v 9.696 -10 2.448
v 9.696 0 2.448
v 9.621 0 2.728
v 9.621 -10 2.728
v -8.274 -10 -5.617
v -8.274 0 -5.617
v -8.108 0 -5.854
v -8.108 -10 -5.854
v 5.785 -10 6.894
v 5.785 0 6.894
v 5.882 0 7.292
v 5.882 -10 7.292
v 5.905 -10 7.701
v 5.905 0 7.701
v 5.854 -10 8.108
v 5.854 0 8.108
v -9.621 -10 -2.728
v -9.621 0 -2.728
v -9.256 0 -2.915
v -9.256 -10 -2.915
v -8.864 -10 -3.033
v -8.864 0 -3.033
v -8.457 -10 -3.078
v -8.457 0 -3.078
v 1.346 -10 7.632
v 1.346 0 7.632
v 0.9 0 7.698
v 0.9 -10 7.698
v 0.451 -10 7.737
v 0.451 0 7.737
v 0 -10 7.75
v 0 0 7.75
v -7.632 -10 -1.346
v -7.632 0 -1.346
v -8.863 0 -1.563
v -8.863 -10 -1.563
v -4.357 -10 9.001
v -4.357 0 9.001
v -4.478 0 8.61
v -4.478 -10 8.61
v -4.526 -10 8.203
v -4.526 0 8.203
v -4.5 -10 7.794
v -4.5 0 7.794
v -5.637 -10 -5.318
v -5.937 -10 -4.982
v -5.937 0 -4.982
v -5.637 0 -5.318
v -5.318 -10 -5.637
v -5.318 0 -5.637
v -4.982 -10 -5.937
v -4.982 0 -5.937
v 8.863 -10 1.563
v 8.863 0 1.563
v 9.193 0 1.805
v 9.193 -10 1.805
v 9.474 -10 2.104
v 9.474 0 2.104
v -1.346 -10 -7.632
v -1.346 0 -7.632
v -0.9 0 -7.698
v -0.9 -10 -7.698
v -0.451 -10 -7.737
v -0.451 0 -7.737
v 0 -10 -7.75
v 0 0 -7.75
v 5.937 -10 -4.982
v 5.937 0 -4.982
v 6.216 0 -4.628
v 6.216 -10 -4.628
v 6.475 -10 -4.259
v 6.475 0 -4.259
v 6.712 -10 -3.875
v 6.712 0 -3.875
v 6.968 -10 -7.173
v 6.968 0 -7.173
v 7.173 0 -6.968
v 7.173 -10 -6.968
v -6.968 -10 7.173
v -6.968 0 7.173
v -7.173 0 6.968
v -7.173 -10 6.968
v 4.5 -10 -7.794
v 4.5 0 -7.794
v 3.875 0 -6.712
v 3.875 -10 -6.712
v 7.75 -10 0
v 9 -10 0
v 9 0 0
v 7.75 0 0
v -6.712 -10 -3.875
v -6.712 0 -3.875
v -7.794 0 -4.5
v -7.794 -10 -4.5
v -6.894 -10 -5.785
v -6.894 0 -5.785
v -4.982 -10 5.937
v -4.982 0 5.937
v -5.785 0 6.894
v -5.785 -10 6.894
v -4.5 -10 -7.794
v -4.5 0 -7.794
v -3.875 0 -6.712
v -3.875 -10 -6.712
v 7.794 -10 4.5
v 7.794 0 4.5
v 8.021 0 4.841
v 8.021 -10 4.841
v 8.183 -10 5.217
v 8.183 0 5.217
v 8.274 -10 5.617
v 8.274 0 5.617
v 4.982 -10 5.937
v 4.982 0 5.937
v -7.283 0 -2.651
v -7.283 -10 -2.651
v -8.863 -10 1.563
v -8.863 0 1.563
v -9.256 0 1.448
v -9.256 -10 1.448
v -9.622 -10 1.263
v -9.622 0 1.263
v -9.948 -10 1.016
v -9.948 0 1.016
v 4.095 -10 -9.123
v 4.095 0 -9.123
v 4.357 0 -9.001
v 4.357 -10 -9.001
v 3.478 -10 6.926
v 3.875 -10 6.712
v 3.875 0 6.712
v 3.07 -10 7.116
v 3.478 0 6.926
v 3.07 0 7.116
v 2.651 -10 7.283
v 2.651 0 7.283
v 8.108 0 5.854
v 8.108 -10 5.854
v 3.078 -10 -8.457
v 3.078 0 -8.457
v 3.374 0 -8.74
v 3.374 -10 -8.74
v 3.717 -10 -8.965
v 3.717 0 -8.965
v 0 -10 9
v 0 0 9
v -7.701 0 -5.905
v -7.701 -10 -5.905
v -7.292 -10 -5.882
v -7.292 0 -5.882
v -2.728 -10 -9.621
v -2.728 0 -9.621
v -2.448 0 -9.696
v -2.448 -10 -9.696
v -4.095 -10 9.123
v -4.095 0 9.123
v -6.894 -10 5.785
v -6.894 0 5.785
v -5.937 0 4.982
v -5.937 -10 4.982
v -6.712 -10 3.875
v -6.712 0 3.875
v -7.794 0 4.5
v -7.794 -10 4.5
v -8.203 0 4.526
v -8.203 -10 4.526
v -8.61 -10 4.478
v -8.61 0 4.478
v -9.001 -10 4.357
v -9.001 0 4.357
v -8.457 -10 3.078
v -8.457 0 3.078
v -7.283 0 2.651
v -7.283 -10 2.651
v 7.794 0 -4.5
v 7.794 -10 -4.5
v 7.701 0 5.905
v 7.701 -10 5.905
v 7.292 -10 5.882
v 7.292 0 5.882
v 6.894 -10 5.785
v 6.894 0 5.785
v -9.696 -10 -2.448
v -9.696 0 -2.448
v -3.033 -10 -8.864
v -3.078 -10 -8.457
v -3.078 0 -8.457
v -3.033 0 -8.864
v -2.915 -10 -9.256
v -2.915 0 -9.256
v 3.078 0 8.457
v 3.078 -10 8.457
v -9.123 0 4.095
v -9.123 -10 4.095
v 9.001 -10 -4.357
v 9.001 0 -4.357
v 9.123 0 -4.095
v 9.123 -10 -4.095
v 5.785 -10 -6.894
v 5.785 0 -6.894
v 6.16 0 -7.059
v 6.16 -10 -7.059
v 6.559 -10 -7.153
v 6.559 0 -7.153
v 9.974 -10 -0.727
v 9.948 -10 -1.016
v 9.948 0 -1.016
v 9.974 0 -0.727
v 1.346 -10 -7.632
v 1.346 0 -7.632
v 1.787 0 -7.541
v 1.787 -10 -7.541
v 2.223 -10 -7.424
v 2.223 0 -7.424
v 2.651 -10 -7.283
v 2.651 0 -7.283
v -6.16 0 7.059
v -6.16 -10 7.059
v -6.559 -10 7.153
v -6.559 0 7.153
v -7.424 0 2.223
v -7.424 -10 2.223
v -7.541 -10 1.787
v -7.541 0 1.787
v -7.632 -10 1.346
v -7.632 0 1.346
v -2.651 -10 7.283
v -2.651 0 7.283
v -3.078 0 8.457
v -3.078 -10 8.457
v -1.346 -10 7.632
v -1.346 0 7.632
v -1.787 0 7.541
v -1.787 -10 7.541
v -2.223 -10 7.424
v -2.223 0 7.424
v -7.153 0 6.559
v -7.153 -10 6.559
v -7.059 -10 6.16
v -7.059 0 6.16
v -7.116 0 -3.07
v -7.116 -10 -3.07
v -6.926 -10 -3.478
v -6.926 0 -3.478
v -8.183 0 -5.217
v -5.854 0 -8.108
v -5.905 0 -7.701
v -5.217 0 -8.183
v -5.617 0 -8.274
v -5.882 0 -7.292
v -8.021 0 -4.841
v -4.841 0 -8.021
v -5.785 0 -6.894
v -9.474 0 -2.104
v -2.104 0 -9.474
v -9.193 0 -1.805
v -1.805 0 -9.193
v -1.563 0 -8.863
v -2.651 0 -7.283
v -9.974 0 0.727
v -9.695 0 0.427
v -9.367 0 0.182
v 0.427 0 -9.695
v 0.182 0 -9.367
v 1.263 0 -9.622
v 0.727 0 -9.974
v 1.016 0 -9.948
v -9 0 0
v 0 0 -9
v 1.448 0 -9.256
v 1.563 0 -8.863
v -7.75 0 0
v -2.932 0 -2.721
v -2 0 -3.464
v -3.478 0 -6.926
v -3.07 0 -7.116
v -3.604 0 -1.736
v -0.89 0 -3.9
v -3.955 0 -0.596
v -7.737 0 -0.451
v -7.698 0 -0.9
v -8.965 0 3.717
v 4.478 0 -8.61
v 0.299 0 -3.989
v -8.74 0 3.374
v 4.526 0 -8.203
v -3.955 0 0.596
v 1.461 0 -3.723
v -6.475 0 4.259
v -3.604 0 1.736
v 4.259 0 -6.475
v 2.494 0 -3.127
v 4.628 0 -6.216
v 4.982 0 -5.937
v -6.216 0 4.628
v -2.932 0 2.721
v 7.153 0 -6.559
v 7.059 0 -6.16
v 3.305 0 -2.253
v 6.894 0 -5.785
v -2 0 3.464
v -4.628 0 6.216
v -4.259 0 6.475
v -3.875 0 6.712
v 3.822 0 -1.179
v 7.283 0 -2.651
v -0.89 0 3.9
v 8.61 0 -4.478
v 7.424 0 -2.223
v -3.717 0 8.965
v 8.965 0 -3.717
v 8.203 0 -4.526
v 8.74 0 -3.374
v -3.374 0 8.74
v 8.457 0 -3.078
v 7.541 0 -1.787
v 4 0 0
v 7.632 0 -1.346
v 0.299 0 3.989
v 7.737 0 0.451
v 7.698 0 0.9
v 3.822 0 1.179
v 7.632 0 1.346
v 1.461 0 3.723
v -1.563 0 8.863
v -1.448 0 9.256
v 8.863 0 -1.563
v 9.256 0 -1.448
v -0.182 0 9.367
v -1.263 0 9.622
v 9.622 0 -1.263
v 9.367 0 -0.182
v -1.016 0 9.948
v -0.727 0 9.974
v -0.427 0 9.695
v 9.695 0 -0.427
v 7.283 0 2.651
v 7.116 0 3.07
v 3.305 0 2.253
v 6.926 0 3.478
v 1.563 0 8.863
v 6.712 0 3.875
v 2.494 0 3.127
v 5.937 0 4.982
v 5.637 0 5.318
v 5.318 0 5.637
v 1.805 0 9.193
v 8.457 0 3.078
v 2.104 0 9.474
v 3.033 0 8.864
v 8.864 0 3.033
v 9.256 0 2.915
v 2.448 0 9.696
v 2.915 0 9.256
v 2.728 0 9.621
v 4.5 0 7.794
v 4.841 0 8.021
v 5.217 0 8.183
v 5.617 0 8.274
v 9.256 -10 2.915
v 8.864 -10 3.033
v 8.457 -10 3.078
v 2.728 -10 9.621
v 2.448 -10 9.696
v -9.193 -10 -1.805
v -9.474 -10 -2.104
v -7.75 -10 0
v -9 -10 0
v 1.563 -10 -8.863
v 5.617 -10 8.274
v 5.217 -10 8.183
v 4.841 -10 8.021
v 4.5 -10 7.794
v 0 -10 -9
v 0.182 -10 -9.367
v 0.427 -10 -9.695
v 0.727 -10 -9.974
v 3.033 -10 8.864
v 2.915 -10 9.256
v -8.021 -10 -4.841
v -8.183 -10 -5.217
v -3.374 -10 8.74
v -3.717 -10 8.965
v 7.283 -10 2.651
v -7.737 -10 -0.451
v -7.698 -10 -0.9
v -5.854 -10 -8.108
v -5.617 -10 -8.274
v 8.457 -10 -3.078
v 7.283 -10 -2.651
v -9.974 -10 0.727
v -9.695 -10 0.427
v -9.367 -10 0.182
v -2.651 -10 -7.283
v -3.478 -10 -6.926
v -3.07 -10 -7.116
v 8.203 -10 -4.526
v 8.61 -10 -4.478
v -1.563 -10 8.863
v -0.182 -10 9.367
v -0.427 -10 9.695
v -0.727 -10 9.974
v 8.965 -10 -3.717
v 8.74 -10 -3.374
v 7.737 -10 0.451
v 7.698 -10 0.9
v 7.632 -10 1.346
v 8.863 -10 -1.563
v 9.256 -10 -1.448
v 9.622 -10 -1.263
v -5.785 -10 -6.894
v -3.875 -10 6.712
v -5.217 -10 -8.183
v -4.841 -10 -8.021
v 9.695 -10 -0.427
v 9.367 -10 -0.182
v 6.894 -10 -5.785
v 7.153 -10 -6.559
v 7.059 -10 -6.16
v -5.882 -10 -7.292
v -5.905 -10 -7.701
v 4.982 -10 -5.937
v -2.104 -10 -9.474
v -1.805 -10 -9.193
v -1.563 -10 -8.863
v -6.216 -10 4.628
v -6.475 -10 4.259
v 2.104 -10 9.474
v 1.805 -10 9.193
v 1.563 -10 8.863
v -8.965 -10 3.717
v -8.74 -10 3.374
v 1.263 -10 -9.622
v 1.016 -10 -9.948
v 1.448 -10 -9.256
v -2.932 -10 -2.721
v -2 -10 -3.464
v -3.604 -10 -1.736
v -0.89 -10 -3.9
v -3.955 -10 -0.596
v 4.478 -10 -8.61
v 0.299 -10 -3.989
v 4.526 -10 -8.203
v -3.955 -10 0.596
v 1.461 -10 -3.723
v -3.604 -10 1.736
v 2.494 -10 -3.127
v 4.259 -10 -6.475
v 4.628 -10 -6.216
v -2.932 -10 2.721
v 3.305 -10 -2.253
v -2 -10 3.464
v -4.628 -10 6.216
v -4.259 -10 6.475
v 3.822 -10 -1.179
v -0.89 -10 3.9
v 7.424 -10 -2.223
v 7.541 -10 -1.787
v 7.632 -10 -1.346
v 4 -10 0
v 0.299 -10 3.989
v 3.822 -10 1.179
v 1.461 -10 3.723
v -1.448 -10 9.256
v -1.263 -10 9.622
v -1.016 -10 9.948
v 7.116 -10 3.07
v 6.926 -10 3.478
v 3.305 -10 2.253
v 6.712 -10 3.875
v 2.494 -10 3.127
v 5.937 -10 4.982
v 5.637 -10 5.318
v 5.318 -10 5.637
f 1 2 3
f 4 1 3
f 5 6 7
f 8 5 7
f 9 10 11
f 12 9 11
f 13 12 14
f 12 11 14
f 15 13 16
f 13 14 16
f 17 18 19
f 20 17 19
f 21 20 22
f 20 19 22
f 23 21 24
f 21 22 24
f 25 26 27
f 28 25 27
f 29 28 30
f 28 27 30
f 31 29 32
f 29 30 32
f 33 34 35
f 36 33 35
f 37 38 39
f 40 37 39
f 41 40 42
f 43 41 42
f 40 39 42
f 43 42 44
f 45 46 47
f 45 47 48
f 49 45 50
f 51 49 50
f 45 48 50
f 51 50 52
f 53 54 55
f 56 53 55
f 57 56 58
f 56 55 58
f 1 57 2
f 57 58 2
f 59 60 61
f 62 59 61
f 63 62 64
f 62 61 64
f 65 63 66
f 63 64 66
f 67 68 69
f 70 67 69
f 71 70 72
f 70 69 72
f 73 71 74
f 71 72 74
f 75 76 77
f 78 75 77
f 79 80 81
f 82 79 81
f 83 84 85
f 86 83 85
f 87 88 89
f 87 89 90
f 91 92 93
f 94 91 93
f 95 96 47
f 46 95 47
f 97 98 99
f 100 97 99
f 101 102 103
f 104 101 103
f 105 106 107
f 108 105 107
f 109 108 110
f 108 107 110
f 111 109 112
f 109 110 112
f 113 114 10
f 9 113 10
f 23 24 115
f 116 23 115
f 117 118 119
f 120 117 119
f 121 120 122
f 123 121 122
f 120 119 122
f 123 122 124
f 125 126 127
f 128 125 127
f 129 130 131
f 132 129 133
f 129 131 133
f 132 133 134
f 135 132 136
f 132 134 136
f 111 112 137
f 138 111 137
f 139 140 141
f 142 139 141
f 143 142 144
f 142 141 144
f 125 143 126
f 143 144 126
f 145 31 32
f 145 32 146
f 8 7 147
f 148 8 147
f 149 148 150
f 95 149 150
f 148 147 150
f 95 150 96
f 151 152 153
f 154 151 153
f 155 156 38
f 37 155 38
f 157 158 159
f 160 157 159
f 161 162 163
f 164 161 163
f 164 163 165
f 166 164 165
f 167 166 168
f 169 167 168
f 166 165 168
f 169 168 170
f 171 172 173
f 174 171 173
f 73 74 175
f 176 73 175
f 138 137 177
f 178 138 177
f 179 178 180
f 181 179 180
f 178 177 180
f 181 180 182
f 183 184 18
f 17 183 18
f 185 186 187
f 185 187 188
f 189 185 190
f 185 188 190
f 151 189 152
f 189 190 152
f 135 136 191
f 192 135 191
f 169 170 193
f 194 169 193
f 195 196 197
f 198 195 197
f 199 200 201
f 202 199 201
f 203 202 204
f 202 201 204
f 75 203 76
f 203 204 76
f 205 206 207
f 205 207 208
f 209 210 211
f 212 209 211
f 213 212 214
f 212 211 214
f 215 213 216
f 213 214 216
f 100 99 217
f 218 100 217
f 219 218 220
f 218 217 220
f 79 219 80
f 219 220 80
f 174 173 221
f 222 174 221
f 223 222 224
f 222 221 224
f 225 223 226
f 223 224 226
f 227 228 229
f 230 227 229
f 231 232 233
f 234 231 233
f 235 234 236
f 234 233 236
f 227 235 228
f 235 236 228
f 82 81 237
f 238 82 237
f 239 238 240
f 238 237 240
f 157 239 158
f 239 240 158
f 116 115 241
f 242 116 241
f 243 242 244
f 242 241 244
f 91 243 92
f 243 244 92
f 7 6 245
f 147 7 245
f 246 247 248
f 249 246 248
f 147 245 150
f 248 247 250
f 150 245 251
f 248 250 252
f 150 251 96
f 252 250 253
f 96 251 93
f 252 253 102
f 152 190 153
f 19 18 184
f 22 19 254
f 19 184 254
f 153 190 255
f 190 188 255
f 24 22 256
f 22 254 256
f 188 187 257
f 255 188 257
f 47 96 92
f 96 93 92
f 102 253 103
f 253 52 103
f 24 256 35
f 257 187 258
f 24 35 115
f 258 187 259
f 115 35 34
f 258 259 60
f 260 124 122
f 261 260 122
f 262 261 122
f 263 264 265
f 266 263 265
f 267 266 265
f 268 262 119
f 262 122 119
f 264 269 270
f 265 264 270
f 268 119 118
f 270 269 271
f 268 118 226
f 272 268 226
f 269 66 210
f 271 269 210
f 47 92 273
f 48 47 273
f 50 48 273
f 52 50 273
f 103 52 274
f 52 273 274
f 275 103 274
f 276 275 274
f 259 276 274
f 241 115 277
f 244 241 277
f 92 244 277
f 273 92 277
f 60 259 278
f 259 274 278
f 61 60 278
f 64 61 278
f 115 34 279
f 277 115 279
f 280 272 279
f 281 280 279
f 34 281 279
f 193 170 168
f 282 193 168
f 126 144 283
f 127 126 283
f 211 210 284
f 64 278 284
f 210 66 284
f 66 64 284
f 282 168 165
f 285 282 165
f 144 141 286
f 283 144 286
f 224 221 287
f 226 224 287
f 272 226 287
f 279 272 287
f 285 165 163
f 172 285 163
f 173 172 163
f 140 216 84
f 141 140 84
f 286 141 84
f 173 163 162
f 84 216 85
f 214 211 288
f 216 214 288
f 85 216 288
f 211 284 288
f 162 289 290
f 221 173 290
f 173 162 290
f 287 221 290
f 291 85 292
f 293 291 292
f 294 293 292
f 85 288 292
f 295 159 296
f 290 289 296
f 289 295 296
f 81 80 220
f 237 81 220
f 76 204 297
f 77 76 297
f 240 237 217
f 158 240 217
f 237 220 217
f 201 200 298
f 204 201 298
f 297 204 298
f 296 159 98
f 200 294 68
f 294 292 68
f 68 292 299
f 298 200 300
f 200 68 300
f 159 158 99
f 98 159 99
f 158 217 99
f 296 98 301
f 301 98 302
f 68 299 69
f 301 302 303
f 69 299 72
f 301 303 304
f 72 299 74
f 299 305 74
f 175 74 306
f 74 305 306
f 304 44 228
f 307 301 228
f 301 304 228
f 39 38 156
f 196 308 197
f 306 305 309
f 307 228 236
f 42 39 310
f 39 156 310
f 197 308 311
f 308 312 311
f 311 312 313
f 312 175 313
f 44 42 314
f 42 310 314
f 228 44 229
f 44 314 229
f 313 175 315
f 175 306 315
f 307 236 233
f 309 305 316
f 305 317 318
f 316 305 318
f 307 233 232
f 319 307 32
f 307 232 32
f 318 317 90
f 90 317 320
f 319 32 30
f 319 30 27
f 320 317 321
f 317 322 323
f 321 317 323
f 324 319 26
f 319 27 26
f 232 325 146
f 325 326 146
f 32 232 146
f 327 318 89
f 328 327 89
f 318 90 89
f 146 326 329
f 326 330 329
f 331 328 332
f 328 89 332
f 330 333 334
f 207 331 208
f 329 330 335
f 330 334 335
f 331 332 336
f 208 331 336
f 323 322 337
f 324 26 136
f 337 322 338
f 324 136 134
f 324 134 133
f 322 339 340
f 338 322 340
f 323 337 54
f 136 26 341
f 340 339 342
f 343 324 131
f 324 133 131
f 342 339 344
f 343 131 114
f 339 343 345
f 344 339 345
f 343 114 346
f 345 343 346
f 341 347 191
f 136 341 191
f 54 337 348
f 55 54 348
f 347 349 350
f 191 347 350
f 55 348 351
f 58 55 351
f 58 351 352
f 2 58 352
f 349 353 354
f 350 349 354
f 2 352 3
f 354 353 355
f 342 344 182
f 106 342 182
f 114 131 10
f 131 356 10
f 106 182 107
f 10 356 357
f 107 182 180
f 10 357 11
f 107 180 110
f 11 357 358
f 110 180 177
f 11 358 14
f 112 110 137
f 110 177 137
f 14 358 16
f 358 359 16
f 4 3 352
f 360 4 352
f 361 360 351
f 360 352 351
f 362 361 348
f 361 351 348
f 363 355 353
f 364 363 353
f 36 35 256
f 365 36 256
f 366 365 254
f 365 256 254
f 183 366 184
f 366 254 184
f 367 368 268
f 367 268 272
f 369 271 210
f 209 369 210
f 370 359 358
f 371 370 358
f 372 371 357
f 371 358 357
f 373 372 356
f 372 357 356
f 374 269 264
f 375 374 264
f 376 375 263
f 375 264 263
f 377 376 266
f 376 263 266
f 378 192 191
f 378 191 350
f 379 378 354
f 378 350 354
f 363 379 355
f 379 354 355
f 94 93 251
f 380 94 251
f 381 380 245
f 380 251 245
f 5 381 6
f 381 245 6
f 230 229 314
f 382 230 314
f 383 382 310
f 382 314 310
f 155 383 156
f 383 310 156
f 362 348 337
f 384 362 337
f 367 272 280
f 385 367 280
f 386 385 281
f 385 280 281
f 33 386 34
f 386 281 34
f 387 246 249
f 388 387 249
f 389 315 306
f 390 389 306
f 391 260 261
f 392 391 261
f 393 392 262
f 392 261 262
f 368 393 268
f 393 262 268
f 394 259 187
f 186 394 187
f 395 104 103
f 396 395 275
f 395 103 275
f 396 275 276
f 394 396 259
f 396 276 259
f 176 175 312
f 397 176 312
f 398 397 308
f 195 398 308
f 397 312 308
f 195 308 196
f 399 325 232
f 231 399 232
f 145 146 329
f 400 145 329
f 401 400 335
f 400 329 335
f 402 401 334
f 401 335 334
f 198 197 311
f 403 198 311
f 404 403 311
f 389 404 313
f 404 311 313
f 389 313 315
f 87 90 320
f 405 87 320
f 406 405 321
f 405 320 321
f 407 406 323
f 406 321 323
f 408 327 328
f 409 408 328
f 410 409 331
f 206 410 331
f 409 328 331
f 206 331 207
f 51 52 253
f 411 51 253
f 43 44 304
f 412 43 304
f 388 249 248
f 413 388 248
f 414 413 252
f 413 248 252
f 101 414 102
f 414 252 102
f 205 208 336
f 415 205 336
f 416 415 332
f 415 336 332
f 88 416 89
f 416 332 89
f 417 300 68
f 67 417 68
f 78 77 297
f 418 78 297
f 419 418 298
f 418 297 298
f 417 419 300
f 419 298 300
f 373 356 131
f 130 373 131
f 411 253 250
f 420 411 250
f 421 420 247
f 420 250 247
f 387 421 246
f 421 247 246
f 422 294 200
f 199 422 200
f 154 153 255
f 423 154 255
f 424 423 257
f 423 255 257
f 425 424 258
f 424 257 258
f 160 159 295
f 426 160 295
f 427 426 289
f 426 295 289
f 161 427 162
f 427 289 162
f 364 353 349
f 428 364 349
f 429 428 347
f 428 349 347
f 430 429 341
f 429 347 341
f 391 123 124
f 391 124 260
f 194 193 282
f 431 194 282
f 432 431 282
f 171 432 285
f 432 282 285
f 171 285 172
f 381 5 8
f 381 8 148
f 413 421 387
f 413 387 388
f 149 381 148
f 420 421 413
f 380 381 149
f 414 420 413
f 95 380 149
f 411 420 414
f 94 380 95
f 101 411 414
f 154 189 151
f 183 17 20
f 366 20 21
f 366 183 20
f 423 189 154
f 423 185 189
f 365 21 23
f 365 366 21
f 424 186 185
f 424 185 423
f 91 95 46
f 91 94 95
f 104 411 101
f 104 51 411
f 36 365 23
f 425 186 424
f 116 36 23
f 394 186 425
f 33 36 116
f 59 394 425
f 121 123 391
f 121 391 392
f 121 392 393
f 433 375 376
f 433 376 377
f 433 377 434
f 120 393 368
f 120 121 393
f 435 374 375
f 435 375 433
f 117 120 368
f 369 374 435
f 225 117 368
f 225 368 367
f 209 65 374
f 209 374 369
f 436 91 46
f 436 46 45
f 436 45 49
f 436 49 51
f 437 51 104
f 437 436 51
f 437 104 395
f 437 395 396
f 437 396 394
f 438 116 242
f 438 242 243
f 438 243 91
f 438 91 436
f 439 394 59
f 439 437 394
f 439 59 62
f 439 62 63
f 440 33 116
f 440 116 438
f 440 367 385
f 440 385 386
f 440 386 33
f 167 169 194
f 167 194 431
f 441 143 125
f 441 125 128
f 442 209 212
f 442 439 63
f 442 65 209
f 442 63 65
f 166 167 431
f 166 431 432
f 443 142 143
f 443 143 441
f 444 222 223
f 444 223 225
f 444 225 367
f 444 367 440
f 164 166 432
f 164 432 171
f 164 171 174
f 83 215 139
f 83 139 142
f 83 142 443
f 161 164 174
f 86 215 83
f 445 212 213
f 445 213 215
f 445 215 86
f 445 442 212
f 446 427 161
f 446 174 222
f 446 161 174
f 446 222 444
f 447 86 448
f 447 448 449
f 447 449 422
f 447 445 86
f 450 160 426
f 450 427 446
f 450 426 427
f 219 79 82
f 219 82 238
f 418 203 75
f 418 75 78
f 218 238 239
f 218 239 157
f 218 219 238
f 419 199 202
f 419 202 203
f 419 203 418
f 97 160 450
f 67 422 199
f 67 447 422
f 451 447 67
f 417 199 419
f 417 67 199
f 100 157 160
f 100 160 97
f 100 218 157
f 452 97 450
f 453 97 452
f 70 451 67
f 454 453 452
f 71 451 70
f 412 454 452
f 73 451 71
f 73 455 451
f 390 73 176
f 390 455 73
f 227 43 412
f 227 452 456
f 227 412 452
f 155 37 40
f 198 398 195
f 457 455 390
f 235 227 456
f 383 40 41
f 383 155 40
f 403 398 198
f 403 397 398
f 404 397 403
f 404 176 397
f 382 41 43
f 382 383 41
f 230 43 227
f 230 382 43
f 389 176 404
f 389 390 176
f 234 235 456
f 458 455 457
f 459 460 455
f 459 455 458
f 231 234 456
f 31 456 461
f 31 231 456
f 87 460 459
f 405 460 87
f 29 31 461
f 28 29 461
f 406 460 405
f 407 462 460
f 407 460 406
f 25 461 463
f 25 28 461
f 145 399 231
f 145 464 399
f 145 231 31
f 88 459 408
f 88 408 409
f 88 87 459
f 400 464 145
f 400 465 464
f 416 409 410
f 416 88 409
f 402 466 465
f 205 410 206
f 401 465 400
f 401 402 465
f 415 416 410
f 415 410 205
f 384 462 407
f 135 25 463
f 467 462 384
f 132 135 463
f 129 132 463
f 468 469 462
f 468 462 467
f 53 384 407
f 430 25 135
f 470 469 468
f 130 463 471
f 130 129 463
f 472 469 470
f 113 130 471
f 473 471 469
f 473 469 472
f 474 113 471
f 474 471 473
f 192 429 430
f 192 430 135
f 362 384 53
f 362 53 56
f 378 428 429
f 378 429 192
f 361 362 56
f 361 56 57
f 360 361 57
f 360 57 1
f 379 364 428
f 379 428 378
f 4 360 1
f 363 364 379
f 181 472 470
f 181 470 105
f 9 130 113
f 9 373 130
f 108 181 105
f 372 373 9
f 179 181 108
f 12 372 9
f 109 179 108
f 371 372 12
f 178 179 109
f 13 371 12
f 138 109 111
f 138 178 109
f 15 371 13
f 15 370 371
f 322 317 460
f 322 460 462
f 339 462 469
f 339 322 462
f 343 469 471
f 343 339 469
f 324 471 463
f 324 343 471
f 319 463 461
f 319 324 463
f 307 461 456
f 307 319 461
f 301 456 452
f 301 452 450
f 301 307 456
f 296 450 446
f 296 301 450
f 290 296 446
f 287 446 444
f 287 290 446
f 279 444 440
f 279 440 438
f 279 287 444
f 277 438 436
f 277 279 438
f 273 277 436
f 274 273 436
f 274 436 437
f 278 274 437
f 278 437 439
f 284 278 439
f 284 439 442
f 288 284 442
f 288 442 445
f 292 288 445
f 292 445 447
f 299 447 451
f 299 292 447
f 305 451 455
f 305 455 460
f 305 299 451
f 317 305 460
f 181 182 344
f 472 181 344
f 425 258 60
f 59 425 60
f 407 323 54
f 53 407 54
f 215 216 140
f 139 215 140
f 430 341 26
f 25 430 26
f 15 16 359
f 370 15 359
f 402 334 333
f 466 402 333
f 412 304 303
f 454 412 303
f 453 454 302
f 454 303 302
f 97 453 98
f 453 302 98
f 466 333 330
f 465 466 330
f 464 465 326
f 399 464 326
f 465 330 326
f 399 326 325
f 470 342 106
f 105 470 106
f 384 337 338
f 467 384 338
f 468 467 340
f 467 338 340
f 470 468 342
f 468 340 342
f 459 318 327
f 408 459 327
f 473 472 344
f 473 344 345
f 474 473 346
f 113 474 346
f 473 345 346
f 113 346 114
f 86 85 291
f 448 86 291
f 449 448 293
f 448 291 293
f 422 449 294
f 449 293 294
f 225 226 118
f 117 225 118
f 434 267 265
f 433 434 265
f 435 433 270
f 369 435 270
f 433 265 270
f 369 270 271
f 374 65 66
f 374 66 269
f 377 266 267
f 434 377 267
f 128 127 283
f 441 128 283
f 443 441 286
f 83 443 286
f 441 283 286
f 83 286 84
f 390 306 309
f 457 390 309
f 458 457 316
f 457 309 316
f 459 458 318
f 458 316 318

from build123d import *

# Parameters (mm, degrees)
F0_R     = 4
F1_DEPTH = 10


with BuildPart() as f1:
    # F0 (on Front) → F1 (new body)
    with BuildSketch(Plane.XZ):
        with BuildLine():
            Line((-1.562834, 8.86327), (-1.345773, 7.63226))
            ThreePointArc((-1.345773, 7.63226), (-2.005848, 7.485925), (-2.650656, 7.282618))
            Line((-2.650656, 7.282618), (-3.078181, 8.457234))
            ThreePointArc((-3.078181, 8.457234), (-3.540527, 8.860187), (-4.094507, 9.123322))
            Line((-4.094507, 9.123322), (-4.356972, 9.000933))
            ThreePointArc((-4.356972, 9.000933), (-4.51149, 8.407419), (-4.5, 7.794229))
            Line((-4.5, 7.794229), (-3.875, 6.711697))
            ThreePointArc((-3.875, 6.711697), (-4.445217, 6.348428), (-4.981604, 5.936844))
            Line((-4.981604, 5.936844), (-5.785088, 6.8944))
            ThreePointArc((-5.785088, 6.8944), (-6.357369, 7.114921), (-6.967938, 7.172715))
            Line((-6.967938, 7.172715), (-7.172715, 6.967938))
            ThreePointArc((-7.172715, 6.967938), (-7.114921, 6.357369), (-6.8944, 5.785088))
            Line((-6.8944, 5.785088), (-5.936844, 4.981604))
            ThreePointArc((-5.936844, 4.981604), (-6.348428, 4.445217), (-6.711697, 3.875))
            Line((-6.711697, 3.875), (-7.794229, 4.5))
            ThreePointArc((-7.794229, 4.5), (-8.407419, 4.51149), (-9.000933, 4.356972))
            Line((-9.000933, 4.356972), (-9.123322, 4.094507))
            ThreePointArc((-9.123322, 4.094507), (-8.860187, 3.540527), (-8.457234, 3.078181))
            Line((-8.457234, 3.078181), (-7.282618, 2.650656))
            ThreePointArc((-7.282618, 2.650656), (-7.485925, 2.005848), (-7.63226, 1.345773))
            Line((-7.63226, 1.345773), (-8.86327, 1.562834))
            ThreePointArc((-8.86327, 1.562834), (-9.44341, 1.363908), (-9.948283, 1.015714))
            Line((-9.948283, 1.015714), (-9.973523, 0.727218))
            ThreePointArc((-9.973523, 0.727218), (-9.536784, 0.296644), (-9, 0))
            Line((-9, 0), (-7.75, 0))
            ThreePointArc((-7.75, 0), (-7.720509, -0.675457), (-7.63226, -1.345773))
            Line((-7.63226, -1.345773), (-8.86327, -1.562834))
            ThreePointArc((-8.86327, -1.562834), (-9.340387, -1.948183), (-9.695722, -2.448054))
            Line((-9.695722, -2.448054), (-9.620769, -2.727784))
            ThreePointArc((-9.620769, -2.727784), (-9.063104, -2.983018), (-8.457234, -3.078181))
            Line((-8.457234, -3.078181), (-7.282618, -2.650656))
            ThreePointArc((-7.282618, -2.650656), (-7.023885, -3.275292), (-6.711697, -3.875))
            Line((-6.711697, -3.875), (-7.794229, -4.5))
            ThreePointArc((-7.794229, -4.5), (-8.110775, -5.025293), (-8.273715, -5.616551))
            Line((-8.273715, -5.616551), (-8.107608, -5.853776))
            ThreePointArc((-8.107608, -5.853776), (-7.496279, -5.902884), (-6.8944, -5.785088))
            Line((-6.8944, -5.785088), (-5.936844, -4.981604))
            ThreePointArc((-5.936844, -4.981604), (-5.480078, -5.480078), (-4.981604, -5.936844))
            Line((-4.981604, -5.936844), (-5.785088, -6.8944))
            ThreePointArc((-5.785088, -6.8944), (-5.902884, -7.496279), (-5.853776, -8.107608))
            Line((-5.853776, -8.107608), (-5.616551, -8.273715))
            ThreePointArc((-5.616551, -8.273715), (-5.025293, -8.110775), (-4.5, -7.794229))
            Line((-4.5, -7.794229), (-3.875, -6.711697))
            ThreePointArc((-3.875, -6.711697), (-3.275292, -7.023885), (-2.650656, -7.282618))
            Line((-2.650656, -7.282618), (-3.078181, -8.457234))
            ThreePointArc((-3.078181, -8.457234), (-2.983018, -9.063104), (-2.727784, -9.620769))
            Line((-2.727784, -9.620769), (-2.448054, -9.695722))
            ThreePointArc((-2.448054, -9.695722), (-1.948183, -9.340387), (-1.562834, -8.86327))
            Line((-1.562834, -8.86327), (-1.345773, -7.63226))
            ThreePointArc((-1.345773, -7.63226), (-0.675457, -7.720509), (0, -7.75))
            Line((0, -7.75), (0, -9))
            ThreePointArc((0, -9), (0.296644, -9.536784), (0.727218, -9.973523))
            Line((0.727218, -9.973523), (1.015714, -9.948283))
            ThreePointArc((1.015714, -9.948283), (1.363908, -9.44341), (1.562834, -8.86327))
            Line((1.562834, -8.86327), (1.345773, -7.63226))
            ThreePointArc((1.345773, -7.63226), (2.005848, -7.485925), (2.650656, -7.282618))
            Line((2.650656, -7.282618), (3.078181, -8.457234))
            ThreePointArc((3.078181, -8.457234), (3.540527, -8.860187), (4.094507, -9.123322))
            Line((4.094507, -9.123322), (4.356972, -9.000933))
            ThreePointArc((4.356972, -9.000933), (4.51149, -8.407419), (4.5, -7.794229))
            Line((4.5, -7.794229), (3.875, -6.711697))
            ThreePointArc((3.875, -6.711697), (4.445217, -6.348428), (4.981604, -5.936844))
            Line((4.981604, -5.936844), (5.785088, -6.8944))
            ThreePointArc((5.785088, -6.8944), (6.357369, -7.114921), (6.967938, -7.172715))
            Line((6.967938, -7.172715), (7.172715, -6.967938))
            ThreePointArc((7.172715, -6.967938), (7.114921, -6.357369), (6.8944, -5.785088))
            Line((6.8944, -5.785088), (5.936844, -4.981604))
            ThreePointArc((5.936844, -4.981604), (6.348428, -4.445217), (6.711697, -3.875))
            Line((6.711697, -3.875), (7.794229, -4.5))
            ThreePointArc((7.794229, -4.5), (8.407419, -4.51149), (9.000933, -4.356972))
            Line((9.000933, -4.356972), (9.123322, -4.094507))
            ThreePointArc((9.123322, -4.094507), (8.860187, -3.540527), (8.457234, -3.078181))
            Line((8.457234, -3.078181), (7.282618, -2.650656))
            ThreePointArc((7.282618, -2.650656), (7.485925, -2.005848), (7.63226, -1.345773))
            Line((7.63226, -1.345773), (8.86327, -1.562834))
            ThreePointArc((8.86327, -1.562834), (9.44341, -1.363908), (9.948283, -1.015714))
            Line((9.948283, -1.015714), (9.973523, -0.727218))
            ThreePointArc((9.973523, -0.727218), (9.536784, -0.296644), (9, 0))
            Line((9, 0), (7.75, 0))
            ThreePointArc((7.75, 0), (7.720509, 0.675457), (7.63226, 1.345773))
            Line((7.63226, 1.345773), (8.86327, 1.562834))
            ThreePointArc((8.86327, 1.562834), (9.340387, 1.948183), (9.695722, 2.448054))
            Line((9.695722, 2.448054), (9.620769, 2.727784))
            ThreePointArc((9.620769, 2.727784), (9.063104, 2.983018), (8.457234, 3.078181))
            Line((8.457234, 3.078181), (7.282618, 2.650656))
            ThreePointArc((7.282618, 2.650656), (7.023885, 3.275292), (6.711697, 3.875))
            Line((6.711697, 3.875), (7.794229, 4.5))
            ThreePointArc((7.794229, 4.5), (8.110775, 5.025293), (8.273715, 5.616551))
            Line((8.273715, 5.616551), (8.107608, 5.853776))
            ThreePointArc((8.107608, 5.853776), (7.496279, 5.902884), (6.8944, 5.785088))
            Line((6.8944, 5.785088), (5.936844, 4.981604))
            ThreePointArc((5.936844, 4.981604), (5.480078, 5.480078), (4.981604, 5.936844))
            Line((4.981604, 5.936844), (5.785088, 6.8944))
            ThreePointArc((5.785088, 6.8944), (5.902884, 7.496279), (5.853776, 8.107608))
            Line((5.853776, 8.107608), (5.616551, 8.273715))
            ThreePointArc((5.616551, 8.273715), (5.025293, 8.110775), (4.5, 7.794229))
            Line((4.5, 7.794229), (3.875, 6.711697))
            ThreePointArc((3.875, 6.711697), (3.275292, 7.023885), (2.650656, 7.282618))
            Line((2.650656, 7.282618), (3.078181, 8.457234))
            ThreePointArc((3.078181, 8.457234), (2.983018, 9.063104), (2.727784, 9.620769))
            Line((2.727784, 9.620769), (2.448054, 9.695722))
            ThreePointArc((2.448054, 9.695722), (1.948183, 9.340387), (1.562834, 8.86327))
            Line((1.562834, 8.86327), (1.345773, 7.63226))
            ThreePointArc((1.345773, 7.63226), (0.675457, 7.720509), (0, 7.75))
            Line((0, 7.75), (0, 9))
            ThreePointArc((0, 9), (-0.296644, 9.536784), (-0.727218, 9.973523))
            Line((-0.727218, 9.973523), (-1.015714, 9.948283))
            ThreePointArc((-1.015714, 9.948283), (-1.363908, 9.44341), (-1.562834, 8.86327))
        make_face()
        Circle(F0_R, mode=Mode.SUBTRACT)
    extrude(amount=F1_DEPTH)


solid = f1.part
